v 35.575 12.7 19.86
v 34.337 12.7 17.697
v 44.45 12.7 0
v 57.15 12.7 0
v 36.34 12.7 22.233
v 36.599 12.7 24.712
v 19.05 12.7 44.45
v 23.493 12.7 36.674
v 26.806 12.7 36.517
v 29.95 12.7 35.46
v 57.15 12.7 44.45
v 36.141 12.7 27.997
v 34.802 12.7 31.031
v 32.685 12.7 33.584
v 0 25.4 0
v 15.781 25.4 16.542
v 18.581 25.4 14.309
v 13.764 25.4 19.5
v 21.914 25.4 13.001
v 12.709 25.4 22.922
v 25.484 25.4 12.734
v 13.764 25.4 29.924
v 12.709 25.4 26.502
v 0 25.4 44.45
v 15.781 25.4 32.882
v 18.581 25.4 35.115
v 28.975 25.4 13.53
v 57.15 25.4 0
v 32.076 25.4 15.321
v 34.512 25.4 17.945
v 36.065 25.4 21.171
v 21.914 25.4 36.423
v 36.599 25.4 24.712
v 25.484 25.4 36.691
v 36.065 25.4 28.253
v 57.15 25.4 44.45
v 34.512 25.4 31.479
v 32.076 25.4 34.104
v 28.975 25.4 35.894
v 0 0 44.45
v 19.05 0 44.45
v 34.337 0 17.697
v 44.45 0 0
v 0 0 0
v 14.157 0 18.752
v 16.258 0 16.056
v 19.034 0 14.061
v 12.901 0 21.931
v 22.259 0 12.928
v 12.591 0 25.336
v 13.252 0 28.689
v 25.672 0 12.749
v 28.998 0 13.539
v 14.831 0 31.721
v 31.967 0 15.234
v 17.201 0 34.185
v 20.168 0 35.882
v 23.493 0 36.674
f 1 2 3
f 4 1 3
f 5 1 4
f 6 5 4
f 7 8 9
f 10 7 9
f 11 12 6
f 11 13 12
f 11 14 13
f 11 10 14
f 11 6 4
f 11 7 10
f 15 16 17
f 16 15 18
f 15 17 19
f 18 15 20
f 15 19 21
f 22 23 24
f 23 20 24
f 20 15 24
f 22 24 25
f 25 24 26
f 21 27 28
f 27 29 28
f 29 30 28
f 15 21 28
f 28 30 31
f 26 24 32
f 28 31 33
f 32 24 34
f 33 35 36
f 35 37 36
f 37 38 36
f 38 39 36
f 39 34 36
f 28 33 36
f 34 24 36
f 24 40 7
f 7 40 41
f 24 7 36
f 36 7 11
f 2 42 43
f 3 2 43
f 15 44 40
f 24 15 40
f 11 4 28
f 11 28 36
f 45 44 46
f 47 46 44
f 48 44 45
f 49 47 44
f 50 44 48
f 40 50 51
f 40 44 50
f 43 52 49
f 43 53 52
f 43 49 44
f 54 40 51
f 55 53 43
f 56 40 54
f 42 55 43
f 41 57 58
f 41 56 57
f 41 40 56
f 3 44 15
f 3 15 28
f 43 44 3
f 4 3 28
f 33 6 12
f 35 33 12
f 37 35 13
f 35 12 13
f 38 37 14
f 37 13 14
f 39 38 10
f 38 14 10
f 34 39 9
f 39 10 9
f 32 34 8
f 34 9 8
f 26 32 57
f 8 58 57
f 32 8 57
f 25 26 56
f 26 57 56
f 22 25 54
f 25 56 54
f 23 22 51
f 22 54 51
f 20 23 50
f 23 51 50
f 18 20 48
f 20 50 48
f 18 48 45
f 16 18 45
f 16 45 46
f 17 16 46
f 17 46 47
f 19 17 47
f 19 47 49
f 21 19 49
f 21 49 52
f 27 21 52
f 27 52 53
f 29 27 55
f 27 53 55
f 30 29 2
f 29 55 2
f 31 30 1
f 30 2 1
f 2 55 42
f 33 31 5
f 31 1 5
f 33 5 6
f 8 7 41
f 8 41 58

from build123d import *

# Parameters (mm, degrees)
F0_W     = 57.15
F0_H     = 44.45
F1_DEPTH = 25.4
F2_W     = 12.7
F2_H     = 44.45
F3_DEPTH = 12.7
F5_DEPTH = 12.7
F6_R     = 12.012115
F7_DEPTH = 25.4


with BuildPart() as f1:
    # F0 (on Front) → F1 (new body)
    with BuildSketch(Plane.XZ):
        with Locations((28.575, 22.225)):
            Rectangle(F0_W, F0_H)
    extrude(amount=-F1_DEPTH)

    # F2 (on Front) → F3 (cut)
    with BuildSketch(Plane.XZ):
        with Locations((50.8, 22.225)):
            Rectangle(F2_W, F2_H)
    extrude(amount=-F3_DEPTH, mode=Mode.SUBTRACT)

    # F4 (on Front) → F5 (cut)
    with BuildSketch(Plane.XZ):
        Polygon((19.05, 44.45), (44.45, 0), (44.45, 44.45), align=None)
    extrude(amount=-F5_DEPTH, mode=Mode.SUBTRACT)

    # F6 (on Front) → F7 (cut)
    with BuildSketch(Plane.XZ):
        with Locations((24.58664, 24.712115)):
            Circle(F6_R)
    extrude(amount=-F7_DEPTH, mode=Mode.SUBTRACT)


solid = f1.part
